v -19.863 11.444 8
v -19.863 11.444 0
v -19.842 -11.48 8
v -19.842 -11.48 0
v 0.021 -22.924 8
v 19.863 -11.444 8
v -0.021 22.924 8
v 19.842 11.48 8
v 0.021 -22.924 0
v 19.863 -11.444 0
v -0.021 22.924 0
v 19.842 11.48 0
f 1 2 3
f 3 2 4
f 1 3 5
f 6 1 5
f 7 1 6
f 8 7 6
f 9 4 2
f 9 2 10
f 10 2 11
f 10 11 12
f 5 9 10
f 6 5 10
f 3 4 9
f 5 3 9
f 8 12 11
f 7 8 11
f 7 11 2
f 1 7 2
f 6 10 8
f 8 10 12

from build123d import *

# Parameters (mm, degrees)
F3_DEPTH = 8
F0_R     = 5.1
F4_DEPTH = 25.4
F5_DEPTH = 25.4


with BuildPart() as f3:
    # F2 (on face) → F3 (new body)
    with BuildSketch(Plane.XY):
        Polygon((0.021091, -22.923663), (19.86302, -11.443566), (19.841929, 11.480097), (-0.021091, 22.923663), (-19.86302, 11.443566), (-19.841929, -11.480097), align=None)
    extrude(amount=F3_DEPTH)

    # F0 (on Top) → F4 (cut)
    with BuildSketch(Plane.XY):
        Circle(F0_R)
    extrude(amount=-F4_DEPTH, mode=Mode.SUBTRACT)

    # F0 (on Top) → F5 (cut)
    with BuildSketch(Plane.XY):
        Circle(F0_R)
    extrude(amount=-F5_DEPTH, mode=Mode.SUBTRACT)


solid = f3.part
